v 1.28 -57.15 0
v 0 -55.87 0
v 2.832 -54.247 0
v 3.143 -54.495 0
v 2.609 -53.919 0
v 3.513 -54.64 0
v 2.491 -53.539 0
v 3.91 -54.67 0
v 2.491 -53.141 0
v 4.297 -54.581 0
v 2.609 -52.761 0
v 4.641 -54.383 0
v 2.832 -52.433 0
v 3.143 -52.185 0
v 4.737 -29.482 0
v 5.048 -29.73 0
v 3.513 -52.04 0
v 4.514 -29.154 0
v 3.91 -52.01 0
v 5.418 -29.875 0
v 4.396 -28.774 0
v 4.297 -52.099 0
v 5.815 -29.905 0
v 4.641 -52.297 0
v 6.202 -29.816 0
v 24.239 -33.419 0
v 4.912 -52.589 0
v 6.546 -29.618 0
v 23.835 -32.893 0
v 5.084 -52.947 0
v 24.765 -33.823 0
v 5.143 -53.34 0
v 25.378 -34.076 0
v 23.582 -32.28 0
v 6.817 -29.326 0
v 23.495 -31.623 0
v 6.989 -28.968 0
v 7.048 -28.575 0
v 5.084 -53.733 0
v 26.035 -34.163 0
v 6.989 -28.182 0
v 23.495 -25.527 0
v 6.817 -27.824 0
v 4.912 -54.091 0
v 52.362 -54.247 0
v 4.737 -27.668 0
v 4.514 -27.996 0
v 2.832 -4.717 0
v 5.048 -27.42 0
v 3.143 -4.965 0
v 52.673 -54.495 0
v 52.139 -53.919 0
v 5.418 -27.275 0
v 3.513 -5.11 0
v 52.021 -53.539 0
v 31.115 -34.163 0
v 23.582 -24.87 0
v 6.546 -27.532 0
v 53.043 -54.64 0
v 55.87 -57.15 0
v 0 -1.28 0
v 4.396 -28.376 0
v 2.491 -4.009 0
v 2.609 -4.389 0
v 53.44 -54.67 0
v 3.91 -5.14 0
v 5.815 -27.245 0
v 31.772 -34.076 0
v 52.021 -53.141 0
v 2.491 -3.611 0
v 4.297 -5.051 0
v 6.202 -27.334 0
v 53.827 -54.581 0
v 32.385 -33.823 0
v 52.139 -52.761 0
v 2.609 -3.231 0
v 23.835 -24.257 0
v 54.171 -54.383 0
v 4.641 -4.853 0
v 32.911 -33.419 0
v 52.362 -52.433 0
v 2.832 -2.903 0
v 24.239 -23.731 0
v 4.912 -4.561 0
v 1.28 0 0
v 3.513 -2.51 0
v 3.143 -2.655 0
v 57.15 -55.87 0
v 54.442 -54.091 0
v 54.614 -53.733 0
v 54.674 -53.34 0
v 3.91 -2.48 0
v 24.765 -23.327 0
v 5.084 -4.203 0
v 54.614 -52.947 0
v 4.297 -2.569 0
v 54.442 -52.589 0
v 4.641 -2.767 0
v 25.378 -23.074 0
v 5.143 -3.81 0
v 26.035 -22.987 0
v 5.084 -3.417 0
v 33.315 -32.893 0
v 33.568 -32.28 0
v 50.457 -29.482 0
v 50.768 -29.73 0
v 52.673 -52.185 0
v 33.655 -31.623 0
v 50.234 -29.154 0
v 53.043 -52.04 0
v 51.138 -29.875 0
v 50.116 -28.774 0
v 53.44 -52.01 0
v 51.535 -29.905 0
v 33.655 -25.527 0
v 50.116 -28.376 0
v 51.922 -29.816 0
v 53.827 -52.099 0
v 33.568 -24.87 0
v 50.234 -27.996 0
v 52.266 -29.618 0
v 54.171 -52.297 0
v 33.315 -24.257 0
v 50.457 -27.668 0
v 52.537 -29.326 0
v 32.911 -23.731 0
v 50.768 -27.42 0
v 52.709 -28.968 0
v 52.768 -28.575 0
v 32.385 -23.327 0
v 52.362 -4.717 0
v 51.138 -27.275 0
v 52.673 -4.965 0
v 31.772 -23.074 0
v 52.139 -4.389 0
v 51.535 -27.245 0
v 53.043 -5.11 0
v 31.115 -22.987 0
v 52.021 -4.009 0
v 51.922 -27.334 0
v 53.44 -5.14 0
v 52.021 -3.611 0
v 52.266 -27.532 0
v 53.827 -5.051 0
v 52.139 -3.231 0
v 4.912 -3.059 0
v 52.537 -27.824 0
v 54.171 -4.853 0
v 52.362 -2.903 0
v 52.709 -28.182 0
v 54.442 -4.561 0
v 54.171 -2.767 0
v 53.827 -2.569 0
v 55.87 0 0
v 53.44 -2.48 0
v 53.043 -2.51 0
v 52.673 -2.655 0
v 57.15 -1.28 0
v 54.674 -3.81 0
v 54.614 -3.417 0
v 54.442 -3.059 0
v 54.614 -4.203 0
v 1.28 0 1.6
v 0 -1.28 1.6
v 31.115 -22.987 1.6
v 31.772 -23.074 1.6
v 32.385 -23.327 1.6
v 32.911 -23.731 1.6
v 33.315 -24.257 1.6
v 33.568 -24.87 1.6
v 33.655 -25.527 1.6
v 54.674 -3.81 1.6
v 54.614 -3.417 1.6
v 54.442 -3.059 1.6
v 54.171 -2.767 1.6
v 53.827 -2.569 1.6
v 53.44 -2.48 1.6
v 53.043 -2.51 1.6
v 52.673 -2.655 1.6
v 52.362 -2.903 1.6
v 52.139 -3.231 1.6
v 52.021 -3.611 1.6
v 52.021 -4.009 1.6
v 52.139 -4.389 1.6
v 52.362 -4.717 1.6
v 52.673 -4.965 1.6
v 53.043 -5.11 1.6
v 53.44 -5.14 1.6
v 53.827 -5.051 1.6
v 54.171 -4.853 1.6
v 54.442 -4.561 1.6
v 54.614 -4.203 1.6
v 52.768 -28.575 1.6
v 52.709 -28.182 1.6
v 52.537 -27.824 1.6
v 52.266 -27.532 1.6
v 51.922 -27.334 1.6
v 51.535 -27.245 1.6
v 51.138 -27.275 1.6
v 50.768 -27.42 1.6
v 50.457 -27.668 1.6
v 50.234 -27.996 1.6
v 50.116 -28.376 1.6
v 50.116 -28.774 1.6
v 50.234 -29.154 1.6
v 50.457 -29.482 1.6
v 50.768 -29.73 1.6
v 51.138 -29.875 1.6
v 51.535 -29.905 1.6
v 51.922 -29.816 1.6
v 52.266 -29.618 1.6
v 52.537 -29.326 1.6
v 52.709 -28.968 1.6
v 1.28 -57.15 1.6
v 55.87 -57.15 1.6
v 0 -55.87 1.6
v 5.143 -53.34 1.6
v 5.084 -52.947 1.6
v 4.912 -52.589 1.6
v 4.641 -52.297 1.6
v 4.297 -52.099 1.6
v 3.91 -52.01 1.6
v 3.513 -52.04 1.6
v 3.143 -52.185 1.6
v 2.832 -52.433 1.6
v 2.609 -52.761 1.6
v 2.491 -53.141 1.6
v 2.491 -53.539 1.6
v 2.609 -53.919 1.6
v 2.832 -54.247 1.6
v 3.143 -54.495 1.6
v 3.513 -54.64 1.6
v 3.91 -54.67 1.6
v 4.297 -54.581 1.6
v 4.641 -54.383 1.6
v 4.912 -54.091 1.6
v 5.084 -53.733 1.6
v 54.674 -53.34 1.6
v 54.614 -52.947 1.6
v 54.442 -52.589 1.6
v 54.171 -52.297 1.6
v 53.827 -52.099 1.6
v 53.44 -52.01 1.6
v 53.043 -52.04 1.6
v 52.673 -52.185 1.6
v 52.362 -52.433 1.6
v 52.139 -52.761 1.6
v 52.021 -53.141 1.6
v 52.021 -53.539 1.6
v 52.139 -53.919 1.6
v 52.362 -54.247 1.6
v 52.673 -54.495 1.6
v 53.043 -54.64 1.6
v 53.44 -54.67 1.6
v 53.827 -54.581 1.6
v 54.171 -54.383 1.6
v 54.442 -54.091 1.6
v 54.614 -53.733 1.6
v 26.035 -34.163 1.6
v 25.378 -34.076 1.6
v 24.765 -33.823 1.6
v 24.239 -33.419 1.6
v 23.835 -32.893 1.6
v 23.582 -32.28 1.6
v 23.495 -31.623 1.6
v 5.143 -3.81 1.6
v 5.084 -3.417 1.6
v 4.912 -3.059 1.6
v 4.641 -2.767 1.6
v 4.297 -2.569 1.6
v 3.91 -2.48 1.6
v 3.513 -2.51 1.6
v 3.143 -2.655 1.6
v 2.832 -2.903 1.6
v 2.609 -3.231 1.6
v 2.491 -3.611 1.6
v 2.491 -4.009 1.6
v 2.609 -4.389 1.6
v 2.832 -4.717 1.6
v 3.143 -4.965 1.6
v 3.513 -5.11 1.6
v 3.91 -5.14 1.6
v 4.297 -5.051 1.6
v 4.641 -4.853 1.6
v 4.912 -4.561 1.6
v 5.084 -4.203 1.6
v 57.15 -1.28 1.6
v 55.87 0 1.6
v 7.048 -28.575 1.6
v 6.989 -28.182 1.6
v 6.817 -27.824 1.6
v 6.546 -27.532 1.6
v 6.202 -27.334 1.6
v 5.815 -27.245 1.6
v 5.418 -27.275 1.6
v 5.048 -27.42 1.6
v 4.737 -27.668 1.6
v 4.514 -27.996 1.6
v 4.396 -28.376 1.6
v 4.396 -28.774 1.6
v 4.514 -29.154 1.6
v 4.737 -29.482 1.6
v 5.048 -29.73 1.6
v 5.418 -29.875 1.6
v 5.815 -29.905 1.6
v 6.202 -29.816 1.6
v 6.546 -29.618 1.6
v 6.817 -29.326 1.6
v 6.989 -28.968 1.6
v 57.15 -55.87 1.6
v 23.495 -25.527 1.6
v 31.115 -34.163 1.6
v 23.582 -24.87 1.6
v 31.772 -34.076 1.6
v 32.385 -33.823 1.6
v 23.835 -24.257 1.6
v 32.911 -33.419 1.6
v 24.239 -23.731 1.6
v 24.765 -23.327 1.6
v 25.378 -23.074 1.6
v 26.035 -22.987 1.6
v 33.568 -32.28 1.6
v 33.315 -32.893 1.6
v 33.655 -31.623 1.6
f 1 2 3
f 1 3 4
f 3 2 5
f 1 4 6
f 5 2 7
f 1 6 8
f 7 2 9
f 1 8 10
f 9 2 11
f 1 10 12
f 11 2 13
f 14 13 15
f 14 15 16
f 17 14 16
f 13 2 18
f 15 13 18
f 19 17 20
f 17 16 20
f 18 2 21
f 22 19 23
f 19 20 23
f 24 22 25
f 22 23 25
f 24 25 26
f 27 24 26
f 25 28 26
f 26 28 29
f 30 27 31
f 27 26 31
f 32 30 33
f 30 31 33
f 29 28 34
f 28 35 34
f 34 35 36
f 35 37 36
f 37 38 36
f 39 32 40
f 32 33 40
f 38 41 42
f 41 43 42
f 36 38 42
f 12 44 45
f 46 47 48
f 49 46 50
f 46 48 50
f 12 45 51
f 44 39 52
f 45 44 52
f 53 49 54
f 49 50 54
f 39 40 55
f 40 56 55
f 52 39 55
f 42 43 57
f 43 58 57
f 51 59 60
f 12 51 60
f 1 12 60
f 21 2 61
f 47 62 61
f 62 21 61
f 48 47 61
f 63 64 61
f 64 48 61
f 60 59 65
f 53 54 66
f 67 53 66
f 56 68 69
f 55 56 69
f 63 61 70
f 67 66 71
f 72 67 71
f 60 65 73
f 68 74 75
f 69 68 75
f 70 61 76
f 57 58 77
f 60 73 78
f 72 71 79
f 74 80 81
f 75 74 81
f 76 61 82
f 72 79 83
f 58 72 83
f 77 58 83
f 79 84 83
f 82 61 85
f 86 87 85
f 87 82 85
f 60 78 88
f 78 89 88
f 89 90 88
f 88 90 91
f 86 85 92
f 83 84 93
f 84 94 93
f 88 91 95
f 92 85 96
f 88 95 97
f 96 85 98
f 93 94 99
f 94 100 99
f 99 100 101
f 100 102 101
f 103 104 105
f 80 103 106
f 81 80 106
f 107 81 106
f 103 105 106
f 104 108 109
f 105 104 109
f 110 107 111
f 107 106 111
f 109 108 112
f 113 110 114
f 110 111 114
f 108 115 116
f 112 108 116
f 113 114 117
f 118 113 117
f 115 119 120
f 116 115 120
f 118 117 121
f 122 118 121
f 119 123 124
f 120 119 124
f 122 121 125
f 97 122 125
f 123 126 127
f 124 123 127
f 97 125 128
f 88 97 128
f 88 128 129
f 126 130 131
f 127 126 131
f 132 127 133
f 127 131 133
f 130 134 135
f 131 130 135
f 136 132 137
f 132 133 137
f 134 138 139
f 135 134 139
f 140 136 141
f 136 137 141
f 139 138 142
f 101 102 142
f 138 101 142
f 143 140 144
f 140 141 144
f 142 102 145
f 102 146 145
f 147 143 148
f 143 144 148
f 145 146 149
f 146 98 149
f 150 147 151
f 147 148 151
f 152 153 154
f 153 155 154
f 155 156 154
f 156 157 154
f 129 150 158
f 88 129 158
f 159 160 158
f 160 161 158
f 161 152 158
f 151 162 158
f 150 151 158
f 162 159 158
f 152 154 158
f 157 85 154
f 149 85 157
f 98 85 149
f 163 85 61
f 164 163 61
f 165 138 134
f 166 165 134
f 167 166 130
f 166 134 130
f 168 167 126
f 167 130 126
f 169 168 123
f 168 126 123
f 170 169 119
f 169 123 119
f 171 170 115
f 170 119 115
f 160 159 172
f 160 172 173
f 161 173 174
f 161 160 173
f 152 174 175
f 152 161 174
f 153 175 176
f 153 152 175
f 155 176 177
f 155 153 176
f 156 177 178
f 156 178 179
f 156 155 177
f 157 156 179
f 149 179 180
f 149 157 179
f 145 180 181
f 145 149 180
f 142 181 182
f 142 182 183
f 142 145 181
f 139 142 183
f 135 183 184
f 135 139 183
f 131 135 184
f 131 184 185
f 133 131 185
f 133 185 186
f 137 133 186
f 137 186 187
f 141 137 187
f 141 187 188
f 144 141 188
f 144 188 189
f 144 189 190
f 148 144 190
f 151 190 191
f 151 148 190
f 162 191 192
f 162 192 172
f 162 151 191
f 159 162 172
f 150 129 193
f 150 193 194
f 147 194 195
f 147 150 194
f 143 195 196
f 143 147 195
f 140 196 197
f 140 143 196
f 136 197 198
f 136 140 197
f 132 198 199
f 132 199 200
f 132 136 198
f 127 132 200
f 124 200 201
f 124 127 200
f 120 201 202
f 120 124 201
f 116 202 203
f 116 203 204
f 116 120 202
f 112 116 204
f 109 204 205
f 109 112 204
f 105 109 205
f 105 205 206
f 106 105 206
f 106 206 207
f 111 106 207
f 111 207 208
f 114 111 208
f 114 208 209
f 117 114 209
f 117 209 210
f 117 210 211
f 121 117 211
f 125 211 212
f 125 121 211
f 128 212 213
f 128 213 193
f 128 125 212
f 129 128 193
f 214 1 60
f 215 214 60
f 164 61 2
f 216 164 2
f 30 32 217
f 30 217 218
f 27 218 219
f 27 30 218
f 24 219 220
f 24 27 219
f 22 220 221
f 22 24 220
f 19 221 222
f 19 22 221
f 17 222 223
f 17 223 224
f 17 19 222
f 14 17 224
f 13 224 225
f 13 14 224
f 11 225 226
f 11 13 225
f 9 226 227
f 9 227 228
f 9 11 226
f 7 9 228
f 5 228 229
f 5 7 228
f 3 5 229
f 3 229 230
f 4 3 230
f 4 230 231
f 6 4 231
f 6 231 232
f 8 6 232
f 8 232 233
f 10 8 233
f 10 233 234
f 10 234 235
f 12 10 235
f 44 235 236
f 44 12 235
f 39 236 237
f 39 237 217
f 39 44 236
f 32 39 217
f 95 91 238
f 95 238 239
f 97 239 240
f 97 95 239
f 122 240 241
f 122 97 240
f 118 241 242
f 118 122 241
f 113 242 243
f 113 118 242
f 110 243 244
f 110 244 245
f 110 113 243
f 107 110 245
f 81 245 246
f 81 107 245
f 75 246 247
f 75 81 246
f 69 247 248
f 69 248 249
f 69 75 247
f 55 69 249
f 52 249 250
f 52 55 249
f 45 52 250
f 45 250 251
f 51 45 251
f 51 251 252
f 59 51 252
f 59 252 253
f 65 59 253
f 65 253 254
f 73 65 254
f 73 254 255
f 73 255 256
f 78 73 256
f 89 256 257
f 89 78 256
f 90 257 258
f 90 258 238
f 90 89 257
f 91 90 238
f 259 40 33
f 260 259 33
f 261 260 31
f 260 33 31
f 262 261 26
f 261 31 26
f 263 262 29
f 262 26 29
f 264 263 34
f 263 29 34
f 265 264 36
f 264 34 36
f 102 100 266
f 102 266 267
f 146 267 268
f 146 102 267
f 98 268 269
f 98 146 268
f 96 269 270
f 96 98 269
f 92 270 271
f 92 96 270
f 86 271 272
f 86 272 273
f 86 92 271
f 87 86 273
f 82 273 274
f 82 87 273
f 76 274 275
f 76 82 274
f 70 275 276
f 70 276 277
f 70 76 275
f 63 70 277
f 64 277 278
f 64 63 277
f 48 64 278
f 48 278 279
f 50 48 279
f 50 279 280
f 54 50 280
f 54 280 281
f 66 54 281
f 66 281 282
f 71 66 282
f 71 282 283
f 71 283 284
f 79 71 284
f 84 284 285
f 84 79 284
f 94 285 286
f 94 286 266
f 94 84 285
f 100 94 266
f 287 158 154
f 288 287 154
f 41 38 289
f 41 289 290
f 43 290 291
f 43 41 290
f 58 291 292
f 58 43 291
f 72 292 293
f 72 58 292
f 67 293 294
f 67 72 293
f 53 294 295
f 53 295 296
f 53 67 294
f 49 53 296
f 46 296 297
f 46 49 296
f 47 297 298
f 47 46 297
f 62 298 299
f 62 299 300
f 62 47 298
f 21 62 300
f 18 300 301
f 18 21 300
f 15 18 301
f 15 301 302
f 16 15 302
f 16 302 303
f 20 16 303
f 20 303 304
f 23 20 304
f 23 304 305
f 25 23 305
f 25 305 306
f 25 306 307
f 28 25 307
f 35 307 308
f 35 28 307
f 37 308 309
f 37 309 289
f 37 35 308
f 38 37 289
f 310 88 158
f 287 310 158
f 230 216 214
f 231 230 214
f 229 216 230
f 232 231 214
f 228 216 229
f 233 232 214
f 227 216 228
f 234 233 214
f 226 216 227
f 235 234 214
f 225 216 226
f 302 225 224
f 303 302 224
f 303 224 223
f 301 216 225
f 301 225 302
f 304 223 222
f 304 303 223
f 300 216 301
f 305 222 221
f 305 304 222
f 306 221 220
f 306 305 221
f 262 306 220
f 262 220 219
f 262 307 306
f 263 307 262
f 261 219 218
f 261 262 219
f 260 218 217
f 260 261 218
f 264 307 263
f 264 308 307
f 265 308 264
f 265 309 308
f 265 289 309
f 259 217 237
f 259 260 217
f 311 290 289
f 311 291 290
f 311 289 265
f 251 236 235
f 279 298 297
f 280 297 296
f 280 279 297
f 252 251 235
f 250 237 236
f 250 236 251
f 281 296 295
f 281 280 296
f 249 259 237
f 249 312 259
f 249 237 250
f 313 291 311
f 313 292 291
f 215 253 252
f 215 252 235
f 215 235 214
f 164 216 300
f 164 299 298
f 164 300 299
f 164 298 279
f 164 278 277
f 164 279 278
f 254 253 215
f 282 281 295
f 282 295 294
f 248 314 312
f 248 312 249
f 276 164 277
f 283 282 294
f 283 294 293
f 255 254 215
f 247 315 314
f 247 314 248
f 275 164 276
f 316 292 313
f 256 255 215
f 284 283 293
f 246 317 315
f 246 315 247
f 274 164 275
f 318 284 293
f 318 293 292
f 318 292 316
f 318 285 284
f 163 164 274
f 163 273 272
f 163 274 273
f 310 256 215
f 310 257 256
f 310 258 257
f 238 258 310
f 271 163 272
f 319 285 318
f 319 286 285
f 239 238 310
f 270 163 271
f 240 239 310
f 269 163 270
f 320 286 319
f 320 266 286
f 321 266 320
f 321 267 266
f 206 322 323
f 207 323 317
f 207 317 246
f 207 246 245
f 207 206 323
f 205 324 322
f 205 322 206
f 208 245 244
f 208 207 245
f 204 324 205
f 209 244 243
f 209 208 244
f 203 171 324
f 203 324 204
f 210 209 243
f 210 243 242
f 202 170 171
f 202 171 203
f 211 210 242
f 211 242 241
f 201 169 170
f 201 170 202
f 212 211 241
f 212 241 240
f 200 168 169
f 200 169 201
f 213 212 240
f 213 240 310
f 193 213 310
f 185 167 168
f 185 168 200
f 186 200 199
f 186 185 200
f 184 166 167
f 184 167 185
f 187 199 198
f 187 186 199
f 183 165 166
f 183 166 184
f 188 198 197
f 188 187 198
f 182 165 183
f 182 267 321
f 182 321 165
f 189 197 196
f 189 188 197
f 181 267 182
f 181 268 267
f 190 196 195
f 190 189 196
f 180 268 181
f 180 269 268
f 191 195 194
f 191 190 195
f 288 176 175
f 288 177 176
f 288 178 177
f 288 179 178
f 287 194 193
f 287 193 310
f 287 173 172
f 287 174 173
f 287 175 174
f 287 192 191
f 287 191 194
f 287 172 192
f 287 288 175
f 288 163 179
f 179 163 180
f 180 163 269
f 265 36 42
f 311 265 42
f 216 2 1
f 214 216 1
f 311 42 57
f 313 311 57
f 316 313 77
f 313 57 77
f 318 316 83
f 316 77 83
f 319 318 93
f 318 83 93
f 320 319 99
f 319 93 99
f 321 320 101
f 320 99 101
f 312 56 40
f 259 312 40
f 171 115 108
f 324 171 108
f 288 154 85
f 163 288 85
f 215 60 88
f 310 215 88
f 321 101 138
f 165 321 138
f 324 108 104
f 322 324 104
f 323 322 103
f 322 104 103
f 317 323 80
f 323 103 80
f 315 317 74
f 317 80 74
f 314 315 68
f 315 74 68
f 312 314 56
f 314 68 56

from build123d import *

# Parameters (mm, degrees)
F0_R     = 1.3335
F1_DEPTH = 1.6


with BuildPart() as f1:
    # F0 (on Top) → F1 (new body)
    with BuildSketch(Plane.XY):
        Polygon((55.87, 0), (1.28, 0), (0, -1.28), (0, -55.87), (1.28, -57.15), (55.87, -57.15), (57.15, -55.87), (57.15, -1.28), align=None)
        with Locations((3.81, -53.34)):
            Circle(F0_R, mode=Mode.SUBTRACT)
        with Locations((53.34, -53.34)):
            Circle(F0_R, mode=Mode.SUBTRACT)
        with Locations((5.715, -28.575)):
            Circle(F0_R, mode=Mode.SUBTRACT)
        with Locations((3.81, -3.81)):
            Circle(F0_R, mode=Mode.SUBTRACT)
        with BuildLine():
            ThreePointArc((23.495, -25.527), (24.238949, -23.730949), (26.035, -22.987))
            Line((26.035, -22.987), (31.115, -22.987))
            ThreePointArc((31.115, -22.987), (32.911051, -23.730949), (33.655, -25.527))
            Line((33.655, -25.527), (33.655, -31.623))
            ThreePointArc((33.655, -31.623), (32.911051, -33.419051), (31.115, -34.163))
            Line((31.115, -34.163), (26.035, -34.163))
            ThreePointArc((26.035, -34.163), (24.238949, -33.419051), (23.495, -31.623))
            Line((23.495, -31.623), (23.495, -25.527))
        make_face(mode=Mode.SUBTRACT)
        with Locations((51.435, -28.575)):
            Circle(F0_R, mode=Mode.SUBTRACT)
        with Locations((53.34, -3.81)):
            Circle(F0_R, mode=Mode.SUBTRACT)
    extrude(amount=F1_DEPTH)


solid = f1.part
